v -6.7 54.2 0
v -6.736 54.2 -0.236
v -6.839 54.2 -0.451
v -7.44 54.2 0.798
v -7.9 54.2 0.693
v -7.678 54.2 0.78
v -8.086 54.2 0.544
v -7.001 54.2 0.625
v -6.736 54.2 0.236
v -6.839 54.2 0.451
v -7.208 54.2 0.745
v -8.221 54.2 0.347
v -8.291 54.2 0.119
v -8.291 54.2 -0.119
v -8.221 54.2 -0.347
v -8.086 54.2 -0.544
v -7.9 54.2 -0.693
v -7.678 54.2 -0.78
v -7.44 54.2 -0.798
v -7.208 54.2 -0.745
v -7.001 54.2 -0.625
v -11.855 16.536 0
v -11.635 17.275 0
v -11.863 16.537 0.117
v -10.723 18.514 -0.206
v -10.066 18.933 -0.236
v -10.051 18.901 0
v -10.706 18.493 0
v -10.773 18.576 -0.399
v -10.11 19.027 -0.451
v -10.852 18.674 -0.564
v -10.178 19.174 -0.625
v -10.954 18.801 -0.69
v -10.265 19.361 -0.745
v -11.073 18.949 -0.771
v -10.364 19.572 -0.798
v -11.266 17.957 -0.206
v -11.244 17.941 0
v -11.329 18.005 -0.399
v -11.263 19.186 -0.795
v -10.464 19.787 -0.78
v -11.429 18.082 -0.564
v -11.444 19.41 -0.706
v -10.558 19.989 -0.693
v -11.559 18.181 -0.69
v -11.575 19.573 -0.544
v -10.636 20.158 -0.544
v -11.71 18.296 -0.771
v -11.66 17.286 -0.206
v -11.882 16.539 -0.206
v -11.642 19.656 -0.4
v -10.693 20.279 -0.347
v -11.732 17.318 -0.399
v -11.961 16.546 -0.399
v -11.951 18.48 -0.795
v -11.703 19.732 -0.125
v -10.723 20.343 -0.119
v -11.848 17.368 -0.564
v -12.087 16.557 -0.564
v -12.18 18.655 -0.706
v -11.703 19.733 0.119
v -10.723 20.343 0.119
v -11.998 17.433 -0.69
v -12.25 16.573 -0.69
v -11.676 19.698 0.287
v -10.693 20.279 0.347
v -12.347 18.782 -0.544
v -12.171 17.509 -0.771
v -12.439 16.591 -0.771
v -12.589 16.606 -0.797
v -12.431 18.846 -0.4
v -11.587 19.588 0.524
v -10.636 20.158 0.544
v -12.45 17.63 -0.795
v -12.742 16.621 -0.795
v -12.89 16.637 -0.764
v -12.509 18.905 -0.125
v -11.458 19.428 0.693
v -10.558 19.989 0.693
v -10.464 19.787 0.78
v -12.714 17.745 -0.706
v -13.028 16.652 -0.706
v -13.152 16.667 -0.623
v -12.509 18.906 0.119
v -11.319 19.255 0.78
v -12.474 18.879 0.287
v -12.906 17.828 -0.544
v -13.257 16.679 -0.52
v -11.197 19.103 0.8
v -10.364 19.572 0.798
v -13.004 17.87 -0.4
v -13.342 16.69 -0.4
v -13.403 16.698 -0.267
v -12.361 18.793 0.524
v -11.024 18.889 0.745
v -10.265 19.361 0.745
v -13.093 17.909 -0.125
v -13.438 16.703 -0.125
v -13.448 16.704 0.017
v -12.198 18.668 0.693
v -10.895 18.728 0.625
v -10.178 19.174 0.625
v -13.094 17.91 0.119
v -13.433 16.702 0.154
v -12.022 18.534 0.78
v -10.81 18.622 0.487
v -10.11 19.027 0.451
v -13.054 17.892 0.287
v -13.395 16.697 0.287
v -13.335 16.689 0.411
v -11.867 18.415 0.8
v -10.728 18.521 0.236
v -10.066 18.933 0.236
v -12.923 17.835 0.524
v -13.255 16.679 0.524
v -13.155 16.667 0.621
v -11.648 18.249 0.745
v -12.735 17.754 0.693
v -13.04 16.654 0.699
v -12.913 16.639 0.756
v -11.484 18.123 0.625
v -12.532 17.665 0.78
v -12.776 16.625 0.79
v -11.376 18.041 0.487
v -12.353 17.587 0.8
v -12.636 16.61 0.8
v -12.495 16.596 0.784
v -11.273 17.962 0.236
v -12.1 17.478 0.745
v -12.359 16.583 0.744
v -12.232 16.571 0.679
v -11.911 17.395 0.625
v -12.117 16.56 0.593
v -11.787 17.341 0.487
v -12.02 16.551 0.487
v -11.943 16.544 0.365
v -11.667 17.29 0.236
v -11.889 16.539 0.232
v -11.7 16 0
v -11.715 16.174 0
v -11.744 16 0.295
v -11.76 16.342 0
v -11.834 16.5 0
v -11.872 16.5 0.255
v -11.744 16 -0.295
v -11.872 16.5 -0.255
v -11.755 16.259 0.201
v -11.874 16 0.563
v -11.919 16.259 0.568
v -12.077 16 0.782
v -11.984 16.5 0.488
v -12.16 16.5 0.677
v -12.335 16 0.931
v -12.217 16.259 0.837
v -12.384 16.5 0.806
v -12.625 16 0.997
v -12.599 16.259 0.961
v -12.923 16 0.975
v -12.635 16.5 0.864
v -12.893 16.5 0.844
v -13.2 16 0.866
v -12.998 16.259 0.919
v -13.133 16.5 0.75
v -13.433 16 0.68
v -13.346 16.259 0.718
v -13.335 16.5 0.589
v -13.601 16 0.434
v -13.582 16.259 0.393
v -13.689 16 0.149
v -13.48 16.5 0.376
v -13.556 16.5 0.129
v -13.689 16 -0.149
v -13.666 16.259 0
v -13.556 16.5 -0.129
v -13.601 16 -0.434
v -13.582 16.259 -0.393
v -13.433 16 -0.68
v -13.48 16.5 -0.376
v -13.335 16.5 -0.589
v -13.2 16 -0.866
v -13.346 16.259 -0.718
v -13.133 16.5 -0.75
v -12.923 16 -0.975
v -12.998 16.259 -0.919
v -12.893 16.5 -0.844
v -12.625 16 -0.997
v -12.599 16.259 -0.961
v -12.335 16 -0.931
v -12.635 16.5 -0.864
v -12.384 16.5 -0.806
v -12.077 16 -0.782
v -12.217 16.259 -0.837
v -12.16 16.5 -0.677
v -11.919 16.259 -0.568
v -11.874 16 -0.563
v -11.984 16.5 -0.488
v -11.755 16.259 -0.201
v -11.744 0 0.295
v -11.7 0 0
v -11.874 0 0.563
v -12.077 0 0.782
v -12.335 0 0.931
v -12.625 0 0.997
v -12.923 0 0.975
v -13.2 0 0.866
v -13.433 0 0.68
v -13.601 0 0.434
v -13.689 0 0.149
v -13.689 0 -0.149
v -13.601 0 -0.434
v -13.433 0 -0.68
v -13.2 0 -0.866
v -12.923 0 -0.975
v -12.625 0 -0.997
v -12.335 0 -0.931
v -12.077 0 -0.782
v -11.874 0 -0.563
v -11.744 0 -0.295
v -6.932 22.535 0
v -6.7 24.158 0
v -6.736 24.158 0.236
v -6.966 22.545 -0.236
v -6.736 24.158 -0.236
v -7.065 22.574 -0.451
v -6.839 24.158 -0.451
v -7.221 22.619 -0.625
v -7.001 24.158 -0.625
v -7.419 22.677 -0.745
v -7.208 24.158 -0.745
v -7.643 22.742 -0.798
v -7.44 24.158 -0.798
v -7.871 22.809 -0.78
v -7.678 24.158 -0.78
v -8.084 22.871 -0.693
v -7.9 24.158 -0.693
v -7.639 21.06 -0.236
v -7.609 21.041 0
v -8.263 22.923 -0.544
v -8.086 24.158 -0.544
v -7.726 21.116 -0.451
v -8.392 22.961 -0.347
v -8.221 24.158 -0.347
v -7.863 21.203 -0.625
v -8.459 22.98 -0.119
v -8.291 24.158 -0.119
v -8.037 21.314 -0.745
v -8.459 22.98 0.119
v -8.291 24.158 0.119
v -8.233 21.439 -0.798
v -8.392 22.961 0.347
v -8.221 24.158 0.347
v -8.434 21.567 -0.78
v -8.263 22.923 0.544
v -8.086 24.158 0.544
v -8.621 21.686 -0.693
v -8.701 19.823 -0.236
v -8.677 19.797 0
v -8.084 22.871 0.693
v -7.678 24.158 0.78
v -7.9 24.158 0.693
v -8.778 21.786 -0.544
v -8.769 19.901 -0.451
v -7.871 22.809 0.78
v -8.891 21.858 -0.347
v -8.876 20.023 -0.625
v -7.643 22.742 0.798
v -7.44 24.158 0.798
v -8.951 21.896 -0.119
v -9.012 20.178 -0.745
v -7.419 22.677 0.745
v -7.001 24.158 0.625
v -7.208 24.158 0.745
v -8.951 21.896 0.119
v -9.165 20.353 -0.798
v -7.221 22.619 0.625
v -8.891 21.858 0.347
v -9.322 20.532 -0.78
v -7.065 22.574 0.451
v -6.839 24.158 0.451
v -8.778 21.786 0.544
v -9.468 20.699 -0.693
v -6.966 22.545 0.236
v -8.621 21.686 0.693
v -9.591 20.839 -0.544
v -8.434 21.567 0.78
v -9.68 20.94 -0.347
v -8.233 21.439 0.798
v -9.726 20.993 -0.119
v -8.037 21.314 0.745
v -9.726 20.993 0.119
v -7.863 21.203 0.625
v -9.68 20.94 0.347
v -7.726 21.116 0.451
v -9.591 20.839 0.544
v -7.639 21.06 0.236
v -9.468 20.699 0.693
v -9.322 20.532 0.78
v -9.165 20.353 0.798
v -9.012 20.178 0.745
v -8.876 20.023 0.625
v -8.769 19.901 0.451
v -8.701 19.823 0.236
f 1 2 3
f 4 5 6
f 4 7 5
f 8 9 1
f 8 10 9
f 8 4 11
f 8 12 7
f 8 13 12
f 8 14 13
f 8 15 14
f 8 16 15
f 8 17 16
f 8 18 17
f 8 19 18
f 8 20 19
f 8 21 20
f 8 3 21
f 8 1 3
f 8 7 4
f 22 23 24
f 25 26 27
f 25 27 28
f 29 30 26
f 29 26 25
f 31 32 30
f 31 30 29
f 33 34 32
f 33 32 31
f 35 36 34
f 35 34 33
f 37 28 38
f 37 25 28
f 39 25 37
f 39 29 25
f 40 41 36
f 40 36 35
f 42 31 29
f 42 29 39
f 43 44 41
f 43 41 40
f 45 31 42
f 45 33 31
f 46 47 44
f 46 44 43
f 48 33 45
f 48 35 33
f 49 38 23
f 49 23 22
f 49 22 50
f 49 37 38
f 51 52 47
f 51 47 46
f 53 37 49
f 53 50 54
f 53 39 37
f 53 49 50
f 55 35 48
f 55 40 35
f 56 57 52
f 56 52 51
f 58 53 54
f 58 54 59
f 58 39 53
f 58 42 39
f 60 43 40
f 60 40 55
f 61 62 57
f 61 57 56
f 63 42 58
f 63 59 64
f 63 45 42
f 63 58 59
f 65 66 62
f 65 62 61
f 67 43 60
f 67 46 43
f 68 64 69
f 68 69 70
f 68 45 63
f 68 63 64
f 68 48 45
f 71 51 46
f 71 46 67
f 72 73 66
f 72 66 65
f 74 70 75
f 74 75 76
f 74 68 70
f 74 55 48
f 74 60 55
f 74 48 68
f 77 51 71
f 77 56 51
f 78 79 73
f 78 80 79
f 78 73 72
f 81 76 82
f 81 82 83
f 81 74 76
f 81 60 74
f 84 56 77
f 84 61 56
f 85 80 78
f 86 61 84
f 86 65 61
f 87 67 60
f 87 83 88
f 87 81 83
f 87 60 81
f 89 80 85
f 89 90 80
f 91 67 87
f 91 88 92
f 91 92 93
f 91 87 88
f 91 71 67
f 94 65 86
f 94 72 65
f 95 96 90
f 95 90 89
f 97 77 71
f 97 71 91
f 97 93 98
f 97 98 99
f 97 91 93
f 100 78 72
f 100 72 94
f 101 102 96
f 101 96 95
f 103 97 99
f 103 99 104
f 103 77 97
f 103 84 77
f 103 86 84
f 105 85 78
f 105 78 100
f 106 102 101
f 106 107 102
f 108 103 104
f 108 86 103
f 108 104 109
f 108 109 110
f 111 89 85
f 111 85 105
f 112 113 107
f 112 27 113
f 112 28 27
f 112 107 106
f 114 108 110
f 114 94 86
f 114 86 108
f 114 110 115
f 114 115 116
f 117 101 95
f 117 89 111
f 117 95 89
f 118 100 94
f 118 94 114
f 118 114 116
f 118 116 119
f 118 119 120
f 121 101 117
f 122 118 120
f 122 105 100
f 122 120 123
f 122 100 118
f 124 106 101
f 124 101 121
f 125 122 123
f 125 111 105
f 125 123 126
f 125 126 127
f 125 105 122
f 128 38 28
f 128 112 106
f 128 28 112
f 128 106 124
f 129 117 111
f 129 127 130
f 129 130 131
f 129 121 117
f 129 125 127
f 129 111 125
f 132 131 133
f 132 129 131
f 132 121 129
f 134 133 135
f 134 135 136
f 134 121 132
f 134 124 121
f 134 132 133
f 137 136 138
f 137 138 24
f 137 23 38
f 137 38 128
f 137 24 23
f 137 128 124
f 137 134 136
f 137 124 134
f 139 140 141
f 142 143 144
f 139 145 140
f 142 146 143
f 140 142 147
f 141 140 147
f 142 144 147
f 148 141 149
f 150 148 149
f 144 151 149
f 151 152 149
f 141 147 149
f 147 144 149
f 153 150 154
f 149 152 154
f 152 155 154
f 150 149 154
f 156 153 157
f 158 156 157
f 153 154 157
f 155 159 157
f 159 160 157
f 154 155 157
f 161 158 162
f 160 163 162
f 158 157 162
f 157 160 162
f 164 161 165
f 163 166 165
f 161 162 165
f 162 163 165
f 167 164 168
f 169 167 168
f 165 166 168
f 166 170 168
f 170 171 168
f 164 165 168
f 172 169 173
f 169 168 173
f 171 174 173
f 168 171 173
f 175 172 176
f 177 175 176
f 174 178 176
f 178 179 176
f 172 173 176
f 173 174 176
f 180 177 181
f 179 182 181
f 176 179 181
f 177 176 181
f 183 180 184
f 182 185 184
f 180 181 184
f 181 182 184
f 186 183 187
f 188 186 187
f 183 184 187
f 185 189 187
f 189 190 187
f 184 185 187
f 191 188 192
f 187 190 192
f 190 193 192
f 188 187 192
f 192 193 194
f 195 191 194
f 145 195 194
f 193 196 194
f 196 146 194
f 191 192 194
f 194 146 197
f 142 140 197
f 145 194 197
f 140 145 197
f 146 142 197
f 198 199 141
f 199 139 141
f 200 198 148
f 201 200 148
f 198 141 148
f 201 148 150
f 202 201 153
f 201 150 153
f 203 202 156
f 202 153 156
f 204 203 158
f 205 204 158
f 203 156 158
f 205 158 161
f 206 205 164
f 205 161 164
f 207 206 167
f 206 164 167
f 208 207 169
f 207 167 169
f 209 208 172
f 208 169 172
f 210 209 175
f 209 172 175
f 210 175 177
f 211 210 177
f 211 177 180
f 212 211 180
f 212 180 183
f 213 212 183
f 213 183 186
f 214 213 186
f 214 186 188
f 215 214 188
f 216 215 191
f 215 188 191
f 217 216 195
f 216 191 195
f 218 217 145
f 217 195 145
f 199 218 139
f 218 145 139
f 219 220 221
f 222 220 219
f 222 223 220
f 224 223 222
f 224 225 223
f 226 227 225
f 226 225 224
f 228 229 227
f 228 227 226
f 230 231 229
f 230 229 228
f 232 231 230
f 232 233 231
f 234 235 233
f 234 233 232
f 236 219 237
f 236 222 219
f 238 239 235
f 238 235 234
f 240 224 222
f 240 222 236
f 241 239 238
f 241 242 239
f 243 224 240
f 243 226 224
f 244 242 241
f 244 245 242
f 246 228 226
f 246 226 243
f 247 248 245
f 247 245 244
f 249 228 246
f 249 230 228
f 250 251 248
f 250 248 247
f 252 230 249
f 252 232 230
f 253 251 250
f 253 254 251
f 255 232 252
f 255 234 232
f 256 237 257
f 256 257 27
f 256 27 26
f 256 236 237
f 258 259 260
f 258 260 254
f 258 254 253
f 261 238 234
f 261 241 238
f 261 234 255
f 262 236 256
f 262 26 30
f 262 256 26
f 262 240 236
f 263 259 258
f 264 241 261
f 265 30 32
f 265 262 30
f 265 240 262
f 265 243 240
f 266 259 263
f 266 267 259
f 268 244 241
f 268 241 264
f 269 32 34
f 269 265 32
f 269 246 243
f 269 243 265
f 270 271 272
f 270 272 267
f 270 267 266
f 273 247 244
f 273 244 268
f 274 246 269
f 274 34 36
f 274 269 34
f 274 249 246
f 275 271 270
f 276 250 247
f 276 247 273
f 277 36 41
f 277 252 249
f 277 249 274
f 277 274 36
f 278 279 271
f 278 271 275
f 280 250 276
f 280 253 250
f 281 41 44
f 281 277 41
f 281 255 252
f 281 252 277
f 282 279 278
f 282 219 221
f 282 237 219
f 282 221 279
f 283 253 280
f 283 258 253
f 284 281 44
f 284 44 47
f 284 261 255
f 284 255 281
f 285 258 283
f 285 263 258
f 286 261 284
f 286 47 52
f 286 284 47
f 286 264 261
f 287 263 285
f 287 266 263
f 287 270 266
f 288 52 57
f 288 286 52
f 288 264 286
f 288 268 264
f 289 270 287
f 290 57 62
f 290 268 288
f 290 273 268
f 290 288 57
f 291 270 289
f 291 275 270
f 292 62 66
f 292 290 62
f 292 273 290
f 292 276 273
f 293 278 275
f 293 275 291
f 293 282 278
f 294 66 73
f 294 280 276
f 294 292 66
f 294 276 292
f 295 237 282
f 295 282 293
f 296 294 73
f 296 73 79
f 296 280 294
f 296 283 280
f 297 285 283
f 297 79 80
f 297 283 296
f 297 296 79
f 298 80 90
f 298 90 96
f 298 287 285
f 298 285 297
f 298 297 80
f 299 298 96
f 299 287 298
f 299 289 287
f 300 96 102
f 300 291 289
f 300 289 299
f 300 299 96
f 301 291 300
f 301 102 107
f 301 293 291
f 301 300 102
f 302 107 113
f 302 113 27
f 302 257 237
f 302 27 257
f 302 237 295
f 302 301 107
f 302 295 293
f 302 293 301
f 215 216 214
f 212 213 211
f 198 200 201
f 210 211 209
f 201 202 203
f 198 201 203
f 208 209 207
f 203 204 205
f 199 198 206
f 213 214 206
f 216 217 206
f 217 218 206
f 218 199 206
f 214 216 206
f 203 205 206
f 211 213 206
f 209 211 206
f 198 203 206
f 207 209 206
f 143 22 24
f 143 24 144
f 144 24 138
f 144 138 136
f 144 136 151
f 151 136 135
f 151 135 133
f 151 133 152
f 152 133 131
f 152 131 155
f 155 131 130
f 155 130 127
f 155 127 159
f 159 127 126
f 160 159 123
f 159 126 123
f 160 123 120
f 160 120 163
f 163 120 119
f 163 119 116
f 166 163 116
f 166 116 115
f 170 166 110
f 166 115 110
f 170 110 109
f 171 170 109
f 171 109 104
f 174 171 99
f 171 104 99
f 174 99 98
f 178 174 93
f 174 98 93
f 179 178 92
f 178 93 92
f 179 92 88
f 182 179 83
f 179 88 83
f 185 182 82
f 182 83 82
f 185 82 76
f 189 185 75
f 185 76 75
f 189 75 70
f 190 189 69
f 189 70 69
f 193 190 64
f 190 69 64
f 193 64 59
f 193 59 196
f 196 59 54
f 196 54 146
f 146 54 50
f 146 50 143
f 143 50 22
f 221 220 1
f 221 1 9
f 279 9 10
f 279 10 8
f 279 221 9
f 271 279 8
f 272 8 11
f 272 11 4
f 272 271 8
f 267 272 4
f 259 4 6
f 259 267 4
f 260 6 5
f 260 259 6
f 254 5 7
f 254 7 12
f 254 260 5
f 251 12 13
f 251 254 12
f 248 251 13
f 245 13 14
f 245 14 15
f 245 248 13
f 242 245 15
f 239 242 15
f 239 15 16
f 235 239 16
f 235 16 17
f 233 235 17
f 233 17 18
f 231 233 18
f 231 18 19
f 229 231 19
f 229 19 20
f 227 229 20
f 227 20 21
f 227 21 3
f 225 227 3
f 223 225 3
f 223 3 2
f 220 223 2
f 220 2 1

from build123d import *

# Parameters (mm, degrees)
SKETCH2_R = 0.8


with BuildPart() as part:
    # Sweep1: sweep along a path in Sketch1
    with BuildLine(Plane.XY) as sweep1_path:
        Line((-7.5, 54.2), (-7.5, 24.158431222))
        ThreePointArc((-7.5, 24.158431222), (-8.283629786, 21.471011972), (-10.388888889, 19.625969432))
        ThreePointArc((-10.388888889, 19.625969432), (-12.073096171, 18.1499354), (-12.7, 16))
        Line((-12.7, 16), (-12.7, 0))
    # Sketch2 → Sweep1 (sweep)
    with BuildSketch(Plane(origin=(0, 0, 0), x_dir=(1, 0, 0), z_dir=(0, 1, 0))):
        with Locations((-12.7, 0)):
            Circle(SKETCH2_R)
    sweep(path=sweep1_path.line)

    # Sketch3 → Revolve1 (revolve)
    with BuildSketch(Plane.XY):
        with BuildLine():
            Line((-12.7, 0), (-11.7, 0))
            Line((-11.7, 0), (-11.7, 16))
            ThreePointArc((-11.7, 16), (-11.734074174, 16.258819045), (-11.833974596, 16.5))
            Line((-11.833974596, 16.5), (-12.7, 18))
            Line((-12.7, 18), (-12.7, 0))
        make_face()
    revolve(axis=Axis((-12.7, 21.819423219, 0), (0, -1, 0)))


solid = part.part
